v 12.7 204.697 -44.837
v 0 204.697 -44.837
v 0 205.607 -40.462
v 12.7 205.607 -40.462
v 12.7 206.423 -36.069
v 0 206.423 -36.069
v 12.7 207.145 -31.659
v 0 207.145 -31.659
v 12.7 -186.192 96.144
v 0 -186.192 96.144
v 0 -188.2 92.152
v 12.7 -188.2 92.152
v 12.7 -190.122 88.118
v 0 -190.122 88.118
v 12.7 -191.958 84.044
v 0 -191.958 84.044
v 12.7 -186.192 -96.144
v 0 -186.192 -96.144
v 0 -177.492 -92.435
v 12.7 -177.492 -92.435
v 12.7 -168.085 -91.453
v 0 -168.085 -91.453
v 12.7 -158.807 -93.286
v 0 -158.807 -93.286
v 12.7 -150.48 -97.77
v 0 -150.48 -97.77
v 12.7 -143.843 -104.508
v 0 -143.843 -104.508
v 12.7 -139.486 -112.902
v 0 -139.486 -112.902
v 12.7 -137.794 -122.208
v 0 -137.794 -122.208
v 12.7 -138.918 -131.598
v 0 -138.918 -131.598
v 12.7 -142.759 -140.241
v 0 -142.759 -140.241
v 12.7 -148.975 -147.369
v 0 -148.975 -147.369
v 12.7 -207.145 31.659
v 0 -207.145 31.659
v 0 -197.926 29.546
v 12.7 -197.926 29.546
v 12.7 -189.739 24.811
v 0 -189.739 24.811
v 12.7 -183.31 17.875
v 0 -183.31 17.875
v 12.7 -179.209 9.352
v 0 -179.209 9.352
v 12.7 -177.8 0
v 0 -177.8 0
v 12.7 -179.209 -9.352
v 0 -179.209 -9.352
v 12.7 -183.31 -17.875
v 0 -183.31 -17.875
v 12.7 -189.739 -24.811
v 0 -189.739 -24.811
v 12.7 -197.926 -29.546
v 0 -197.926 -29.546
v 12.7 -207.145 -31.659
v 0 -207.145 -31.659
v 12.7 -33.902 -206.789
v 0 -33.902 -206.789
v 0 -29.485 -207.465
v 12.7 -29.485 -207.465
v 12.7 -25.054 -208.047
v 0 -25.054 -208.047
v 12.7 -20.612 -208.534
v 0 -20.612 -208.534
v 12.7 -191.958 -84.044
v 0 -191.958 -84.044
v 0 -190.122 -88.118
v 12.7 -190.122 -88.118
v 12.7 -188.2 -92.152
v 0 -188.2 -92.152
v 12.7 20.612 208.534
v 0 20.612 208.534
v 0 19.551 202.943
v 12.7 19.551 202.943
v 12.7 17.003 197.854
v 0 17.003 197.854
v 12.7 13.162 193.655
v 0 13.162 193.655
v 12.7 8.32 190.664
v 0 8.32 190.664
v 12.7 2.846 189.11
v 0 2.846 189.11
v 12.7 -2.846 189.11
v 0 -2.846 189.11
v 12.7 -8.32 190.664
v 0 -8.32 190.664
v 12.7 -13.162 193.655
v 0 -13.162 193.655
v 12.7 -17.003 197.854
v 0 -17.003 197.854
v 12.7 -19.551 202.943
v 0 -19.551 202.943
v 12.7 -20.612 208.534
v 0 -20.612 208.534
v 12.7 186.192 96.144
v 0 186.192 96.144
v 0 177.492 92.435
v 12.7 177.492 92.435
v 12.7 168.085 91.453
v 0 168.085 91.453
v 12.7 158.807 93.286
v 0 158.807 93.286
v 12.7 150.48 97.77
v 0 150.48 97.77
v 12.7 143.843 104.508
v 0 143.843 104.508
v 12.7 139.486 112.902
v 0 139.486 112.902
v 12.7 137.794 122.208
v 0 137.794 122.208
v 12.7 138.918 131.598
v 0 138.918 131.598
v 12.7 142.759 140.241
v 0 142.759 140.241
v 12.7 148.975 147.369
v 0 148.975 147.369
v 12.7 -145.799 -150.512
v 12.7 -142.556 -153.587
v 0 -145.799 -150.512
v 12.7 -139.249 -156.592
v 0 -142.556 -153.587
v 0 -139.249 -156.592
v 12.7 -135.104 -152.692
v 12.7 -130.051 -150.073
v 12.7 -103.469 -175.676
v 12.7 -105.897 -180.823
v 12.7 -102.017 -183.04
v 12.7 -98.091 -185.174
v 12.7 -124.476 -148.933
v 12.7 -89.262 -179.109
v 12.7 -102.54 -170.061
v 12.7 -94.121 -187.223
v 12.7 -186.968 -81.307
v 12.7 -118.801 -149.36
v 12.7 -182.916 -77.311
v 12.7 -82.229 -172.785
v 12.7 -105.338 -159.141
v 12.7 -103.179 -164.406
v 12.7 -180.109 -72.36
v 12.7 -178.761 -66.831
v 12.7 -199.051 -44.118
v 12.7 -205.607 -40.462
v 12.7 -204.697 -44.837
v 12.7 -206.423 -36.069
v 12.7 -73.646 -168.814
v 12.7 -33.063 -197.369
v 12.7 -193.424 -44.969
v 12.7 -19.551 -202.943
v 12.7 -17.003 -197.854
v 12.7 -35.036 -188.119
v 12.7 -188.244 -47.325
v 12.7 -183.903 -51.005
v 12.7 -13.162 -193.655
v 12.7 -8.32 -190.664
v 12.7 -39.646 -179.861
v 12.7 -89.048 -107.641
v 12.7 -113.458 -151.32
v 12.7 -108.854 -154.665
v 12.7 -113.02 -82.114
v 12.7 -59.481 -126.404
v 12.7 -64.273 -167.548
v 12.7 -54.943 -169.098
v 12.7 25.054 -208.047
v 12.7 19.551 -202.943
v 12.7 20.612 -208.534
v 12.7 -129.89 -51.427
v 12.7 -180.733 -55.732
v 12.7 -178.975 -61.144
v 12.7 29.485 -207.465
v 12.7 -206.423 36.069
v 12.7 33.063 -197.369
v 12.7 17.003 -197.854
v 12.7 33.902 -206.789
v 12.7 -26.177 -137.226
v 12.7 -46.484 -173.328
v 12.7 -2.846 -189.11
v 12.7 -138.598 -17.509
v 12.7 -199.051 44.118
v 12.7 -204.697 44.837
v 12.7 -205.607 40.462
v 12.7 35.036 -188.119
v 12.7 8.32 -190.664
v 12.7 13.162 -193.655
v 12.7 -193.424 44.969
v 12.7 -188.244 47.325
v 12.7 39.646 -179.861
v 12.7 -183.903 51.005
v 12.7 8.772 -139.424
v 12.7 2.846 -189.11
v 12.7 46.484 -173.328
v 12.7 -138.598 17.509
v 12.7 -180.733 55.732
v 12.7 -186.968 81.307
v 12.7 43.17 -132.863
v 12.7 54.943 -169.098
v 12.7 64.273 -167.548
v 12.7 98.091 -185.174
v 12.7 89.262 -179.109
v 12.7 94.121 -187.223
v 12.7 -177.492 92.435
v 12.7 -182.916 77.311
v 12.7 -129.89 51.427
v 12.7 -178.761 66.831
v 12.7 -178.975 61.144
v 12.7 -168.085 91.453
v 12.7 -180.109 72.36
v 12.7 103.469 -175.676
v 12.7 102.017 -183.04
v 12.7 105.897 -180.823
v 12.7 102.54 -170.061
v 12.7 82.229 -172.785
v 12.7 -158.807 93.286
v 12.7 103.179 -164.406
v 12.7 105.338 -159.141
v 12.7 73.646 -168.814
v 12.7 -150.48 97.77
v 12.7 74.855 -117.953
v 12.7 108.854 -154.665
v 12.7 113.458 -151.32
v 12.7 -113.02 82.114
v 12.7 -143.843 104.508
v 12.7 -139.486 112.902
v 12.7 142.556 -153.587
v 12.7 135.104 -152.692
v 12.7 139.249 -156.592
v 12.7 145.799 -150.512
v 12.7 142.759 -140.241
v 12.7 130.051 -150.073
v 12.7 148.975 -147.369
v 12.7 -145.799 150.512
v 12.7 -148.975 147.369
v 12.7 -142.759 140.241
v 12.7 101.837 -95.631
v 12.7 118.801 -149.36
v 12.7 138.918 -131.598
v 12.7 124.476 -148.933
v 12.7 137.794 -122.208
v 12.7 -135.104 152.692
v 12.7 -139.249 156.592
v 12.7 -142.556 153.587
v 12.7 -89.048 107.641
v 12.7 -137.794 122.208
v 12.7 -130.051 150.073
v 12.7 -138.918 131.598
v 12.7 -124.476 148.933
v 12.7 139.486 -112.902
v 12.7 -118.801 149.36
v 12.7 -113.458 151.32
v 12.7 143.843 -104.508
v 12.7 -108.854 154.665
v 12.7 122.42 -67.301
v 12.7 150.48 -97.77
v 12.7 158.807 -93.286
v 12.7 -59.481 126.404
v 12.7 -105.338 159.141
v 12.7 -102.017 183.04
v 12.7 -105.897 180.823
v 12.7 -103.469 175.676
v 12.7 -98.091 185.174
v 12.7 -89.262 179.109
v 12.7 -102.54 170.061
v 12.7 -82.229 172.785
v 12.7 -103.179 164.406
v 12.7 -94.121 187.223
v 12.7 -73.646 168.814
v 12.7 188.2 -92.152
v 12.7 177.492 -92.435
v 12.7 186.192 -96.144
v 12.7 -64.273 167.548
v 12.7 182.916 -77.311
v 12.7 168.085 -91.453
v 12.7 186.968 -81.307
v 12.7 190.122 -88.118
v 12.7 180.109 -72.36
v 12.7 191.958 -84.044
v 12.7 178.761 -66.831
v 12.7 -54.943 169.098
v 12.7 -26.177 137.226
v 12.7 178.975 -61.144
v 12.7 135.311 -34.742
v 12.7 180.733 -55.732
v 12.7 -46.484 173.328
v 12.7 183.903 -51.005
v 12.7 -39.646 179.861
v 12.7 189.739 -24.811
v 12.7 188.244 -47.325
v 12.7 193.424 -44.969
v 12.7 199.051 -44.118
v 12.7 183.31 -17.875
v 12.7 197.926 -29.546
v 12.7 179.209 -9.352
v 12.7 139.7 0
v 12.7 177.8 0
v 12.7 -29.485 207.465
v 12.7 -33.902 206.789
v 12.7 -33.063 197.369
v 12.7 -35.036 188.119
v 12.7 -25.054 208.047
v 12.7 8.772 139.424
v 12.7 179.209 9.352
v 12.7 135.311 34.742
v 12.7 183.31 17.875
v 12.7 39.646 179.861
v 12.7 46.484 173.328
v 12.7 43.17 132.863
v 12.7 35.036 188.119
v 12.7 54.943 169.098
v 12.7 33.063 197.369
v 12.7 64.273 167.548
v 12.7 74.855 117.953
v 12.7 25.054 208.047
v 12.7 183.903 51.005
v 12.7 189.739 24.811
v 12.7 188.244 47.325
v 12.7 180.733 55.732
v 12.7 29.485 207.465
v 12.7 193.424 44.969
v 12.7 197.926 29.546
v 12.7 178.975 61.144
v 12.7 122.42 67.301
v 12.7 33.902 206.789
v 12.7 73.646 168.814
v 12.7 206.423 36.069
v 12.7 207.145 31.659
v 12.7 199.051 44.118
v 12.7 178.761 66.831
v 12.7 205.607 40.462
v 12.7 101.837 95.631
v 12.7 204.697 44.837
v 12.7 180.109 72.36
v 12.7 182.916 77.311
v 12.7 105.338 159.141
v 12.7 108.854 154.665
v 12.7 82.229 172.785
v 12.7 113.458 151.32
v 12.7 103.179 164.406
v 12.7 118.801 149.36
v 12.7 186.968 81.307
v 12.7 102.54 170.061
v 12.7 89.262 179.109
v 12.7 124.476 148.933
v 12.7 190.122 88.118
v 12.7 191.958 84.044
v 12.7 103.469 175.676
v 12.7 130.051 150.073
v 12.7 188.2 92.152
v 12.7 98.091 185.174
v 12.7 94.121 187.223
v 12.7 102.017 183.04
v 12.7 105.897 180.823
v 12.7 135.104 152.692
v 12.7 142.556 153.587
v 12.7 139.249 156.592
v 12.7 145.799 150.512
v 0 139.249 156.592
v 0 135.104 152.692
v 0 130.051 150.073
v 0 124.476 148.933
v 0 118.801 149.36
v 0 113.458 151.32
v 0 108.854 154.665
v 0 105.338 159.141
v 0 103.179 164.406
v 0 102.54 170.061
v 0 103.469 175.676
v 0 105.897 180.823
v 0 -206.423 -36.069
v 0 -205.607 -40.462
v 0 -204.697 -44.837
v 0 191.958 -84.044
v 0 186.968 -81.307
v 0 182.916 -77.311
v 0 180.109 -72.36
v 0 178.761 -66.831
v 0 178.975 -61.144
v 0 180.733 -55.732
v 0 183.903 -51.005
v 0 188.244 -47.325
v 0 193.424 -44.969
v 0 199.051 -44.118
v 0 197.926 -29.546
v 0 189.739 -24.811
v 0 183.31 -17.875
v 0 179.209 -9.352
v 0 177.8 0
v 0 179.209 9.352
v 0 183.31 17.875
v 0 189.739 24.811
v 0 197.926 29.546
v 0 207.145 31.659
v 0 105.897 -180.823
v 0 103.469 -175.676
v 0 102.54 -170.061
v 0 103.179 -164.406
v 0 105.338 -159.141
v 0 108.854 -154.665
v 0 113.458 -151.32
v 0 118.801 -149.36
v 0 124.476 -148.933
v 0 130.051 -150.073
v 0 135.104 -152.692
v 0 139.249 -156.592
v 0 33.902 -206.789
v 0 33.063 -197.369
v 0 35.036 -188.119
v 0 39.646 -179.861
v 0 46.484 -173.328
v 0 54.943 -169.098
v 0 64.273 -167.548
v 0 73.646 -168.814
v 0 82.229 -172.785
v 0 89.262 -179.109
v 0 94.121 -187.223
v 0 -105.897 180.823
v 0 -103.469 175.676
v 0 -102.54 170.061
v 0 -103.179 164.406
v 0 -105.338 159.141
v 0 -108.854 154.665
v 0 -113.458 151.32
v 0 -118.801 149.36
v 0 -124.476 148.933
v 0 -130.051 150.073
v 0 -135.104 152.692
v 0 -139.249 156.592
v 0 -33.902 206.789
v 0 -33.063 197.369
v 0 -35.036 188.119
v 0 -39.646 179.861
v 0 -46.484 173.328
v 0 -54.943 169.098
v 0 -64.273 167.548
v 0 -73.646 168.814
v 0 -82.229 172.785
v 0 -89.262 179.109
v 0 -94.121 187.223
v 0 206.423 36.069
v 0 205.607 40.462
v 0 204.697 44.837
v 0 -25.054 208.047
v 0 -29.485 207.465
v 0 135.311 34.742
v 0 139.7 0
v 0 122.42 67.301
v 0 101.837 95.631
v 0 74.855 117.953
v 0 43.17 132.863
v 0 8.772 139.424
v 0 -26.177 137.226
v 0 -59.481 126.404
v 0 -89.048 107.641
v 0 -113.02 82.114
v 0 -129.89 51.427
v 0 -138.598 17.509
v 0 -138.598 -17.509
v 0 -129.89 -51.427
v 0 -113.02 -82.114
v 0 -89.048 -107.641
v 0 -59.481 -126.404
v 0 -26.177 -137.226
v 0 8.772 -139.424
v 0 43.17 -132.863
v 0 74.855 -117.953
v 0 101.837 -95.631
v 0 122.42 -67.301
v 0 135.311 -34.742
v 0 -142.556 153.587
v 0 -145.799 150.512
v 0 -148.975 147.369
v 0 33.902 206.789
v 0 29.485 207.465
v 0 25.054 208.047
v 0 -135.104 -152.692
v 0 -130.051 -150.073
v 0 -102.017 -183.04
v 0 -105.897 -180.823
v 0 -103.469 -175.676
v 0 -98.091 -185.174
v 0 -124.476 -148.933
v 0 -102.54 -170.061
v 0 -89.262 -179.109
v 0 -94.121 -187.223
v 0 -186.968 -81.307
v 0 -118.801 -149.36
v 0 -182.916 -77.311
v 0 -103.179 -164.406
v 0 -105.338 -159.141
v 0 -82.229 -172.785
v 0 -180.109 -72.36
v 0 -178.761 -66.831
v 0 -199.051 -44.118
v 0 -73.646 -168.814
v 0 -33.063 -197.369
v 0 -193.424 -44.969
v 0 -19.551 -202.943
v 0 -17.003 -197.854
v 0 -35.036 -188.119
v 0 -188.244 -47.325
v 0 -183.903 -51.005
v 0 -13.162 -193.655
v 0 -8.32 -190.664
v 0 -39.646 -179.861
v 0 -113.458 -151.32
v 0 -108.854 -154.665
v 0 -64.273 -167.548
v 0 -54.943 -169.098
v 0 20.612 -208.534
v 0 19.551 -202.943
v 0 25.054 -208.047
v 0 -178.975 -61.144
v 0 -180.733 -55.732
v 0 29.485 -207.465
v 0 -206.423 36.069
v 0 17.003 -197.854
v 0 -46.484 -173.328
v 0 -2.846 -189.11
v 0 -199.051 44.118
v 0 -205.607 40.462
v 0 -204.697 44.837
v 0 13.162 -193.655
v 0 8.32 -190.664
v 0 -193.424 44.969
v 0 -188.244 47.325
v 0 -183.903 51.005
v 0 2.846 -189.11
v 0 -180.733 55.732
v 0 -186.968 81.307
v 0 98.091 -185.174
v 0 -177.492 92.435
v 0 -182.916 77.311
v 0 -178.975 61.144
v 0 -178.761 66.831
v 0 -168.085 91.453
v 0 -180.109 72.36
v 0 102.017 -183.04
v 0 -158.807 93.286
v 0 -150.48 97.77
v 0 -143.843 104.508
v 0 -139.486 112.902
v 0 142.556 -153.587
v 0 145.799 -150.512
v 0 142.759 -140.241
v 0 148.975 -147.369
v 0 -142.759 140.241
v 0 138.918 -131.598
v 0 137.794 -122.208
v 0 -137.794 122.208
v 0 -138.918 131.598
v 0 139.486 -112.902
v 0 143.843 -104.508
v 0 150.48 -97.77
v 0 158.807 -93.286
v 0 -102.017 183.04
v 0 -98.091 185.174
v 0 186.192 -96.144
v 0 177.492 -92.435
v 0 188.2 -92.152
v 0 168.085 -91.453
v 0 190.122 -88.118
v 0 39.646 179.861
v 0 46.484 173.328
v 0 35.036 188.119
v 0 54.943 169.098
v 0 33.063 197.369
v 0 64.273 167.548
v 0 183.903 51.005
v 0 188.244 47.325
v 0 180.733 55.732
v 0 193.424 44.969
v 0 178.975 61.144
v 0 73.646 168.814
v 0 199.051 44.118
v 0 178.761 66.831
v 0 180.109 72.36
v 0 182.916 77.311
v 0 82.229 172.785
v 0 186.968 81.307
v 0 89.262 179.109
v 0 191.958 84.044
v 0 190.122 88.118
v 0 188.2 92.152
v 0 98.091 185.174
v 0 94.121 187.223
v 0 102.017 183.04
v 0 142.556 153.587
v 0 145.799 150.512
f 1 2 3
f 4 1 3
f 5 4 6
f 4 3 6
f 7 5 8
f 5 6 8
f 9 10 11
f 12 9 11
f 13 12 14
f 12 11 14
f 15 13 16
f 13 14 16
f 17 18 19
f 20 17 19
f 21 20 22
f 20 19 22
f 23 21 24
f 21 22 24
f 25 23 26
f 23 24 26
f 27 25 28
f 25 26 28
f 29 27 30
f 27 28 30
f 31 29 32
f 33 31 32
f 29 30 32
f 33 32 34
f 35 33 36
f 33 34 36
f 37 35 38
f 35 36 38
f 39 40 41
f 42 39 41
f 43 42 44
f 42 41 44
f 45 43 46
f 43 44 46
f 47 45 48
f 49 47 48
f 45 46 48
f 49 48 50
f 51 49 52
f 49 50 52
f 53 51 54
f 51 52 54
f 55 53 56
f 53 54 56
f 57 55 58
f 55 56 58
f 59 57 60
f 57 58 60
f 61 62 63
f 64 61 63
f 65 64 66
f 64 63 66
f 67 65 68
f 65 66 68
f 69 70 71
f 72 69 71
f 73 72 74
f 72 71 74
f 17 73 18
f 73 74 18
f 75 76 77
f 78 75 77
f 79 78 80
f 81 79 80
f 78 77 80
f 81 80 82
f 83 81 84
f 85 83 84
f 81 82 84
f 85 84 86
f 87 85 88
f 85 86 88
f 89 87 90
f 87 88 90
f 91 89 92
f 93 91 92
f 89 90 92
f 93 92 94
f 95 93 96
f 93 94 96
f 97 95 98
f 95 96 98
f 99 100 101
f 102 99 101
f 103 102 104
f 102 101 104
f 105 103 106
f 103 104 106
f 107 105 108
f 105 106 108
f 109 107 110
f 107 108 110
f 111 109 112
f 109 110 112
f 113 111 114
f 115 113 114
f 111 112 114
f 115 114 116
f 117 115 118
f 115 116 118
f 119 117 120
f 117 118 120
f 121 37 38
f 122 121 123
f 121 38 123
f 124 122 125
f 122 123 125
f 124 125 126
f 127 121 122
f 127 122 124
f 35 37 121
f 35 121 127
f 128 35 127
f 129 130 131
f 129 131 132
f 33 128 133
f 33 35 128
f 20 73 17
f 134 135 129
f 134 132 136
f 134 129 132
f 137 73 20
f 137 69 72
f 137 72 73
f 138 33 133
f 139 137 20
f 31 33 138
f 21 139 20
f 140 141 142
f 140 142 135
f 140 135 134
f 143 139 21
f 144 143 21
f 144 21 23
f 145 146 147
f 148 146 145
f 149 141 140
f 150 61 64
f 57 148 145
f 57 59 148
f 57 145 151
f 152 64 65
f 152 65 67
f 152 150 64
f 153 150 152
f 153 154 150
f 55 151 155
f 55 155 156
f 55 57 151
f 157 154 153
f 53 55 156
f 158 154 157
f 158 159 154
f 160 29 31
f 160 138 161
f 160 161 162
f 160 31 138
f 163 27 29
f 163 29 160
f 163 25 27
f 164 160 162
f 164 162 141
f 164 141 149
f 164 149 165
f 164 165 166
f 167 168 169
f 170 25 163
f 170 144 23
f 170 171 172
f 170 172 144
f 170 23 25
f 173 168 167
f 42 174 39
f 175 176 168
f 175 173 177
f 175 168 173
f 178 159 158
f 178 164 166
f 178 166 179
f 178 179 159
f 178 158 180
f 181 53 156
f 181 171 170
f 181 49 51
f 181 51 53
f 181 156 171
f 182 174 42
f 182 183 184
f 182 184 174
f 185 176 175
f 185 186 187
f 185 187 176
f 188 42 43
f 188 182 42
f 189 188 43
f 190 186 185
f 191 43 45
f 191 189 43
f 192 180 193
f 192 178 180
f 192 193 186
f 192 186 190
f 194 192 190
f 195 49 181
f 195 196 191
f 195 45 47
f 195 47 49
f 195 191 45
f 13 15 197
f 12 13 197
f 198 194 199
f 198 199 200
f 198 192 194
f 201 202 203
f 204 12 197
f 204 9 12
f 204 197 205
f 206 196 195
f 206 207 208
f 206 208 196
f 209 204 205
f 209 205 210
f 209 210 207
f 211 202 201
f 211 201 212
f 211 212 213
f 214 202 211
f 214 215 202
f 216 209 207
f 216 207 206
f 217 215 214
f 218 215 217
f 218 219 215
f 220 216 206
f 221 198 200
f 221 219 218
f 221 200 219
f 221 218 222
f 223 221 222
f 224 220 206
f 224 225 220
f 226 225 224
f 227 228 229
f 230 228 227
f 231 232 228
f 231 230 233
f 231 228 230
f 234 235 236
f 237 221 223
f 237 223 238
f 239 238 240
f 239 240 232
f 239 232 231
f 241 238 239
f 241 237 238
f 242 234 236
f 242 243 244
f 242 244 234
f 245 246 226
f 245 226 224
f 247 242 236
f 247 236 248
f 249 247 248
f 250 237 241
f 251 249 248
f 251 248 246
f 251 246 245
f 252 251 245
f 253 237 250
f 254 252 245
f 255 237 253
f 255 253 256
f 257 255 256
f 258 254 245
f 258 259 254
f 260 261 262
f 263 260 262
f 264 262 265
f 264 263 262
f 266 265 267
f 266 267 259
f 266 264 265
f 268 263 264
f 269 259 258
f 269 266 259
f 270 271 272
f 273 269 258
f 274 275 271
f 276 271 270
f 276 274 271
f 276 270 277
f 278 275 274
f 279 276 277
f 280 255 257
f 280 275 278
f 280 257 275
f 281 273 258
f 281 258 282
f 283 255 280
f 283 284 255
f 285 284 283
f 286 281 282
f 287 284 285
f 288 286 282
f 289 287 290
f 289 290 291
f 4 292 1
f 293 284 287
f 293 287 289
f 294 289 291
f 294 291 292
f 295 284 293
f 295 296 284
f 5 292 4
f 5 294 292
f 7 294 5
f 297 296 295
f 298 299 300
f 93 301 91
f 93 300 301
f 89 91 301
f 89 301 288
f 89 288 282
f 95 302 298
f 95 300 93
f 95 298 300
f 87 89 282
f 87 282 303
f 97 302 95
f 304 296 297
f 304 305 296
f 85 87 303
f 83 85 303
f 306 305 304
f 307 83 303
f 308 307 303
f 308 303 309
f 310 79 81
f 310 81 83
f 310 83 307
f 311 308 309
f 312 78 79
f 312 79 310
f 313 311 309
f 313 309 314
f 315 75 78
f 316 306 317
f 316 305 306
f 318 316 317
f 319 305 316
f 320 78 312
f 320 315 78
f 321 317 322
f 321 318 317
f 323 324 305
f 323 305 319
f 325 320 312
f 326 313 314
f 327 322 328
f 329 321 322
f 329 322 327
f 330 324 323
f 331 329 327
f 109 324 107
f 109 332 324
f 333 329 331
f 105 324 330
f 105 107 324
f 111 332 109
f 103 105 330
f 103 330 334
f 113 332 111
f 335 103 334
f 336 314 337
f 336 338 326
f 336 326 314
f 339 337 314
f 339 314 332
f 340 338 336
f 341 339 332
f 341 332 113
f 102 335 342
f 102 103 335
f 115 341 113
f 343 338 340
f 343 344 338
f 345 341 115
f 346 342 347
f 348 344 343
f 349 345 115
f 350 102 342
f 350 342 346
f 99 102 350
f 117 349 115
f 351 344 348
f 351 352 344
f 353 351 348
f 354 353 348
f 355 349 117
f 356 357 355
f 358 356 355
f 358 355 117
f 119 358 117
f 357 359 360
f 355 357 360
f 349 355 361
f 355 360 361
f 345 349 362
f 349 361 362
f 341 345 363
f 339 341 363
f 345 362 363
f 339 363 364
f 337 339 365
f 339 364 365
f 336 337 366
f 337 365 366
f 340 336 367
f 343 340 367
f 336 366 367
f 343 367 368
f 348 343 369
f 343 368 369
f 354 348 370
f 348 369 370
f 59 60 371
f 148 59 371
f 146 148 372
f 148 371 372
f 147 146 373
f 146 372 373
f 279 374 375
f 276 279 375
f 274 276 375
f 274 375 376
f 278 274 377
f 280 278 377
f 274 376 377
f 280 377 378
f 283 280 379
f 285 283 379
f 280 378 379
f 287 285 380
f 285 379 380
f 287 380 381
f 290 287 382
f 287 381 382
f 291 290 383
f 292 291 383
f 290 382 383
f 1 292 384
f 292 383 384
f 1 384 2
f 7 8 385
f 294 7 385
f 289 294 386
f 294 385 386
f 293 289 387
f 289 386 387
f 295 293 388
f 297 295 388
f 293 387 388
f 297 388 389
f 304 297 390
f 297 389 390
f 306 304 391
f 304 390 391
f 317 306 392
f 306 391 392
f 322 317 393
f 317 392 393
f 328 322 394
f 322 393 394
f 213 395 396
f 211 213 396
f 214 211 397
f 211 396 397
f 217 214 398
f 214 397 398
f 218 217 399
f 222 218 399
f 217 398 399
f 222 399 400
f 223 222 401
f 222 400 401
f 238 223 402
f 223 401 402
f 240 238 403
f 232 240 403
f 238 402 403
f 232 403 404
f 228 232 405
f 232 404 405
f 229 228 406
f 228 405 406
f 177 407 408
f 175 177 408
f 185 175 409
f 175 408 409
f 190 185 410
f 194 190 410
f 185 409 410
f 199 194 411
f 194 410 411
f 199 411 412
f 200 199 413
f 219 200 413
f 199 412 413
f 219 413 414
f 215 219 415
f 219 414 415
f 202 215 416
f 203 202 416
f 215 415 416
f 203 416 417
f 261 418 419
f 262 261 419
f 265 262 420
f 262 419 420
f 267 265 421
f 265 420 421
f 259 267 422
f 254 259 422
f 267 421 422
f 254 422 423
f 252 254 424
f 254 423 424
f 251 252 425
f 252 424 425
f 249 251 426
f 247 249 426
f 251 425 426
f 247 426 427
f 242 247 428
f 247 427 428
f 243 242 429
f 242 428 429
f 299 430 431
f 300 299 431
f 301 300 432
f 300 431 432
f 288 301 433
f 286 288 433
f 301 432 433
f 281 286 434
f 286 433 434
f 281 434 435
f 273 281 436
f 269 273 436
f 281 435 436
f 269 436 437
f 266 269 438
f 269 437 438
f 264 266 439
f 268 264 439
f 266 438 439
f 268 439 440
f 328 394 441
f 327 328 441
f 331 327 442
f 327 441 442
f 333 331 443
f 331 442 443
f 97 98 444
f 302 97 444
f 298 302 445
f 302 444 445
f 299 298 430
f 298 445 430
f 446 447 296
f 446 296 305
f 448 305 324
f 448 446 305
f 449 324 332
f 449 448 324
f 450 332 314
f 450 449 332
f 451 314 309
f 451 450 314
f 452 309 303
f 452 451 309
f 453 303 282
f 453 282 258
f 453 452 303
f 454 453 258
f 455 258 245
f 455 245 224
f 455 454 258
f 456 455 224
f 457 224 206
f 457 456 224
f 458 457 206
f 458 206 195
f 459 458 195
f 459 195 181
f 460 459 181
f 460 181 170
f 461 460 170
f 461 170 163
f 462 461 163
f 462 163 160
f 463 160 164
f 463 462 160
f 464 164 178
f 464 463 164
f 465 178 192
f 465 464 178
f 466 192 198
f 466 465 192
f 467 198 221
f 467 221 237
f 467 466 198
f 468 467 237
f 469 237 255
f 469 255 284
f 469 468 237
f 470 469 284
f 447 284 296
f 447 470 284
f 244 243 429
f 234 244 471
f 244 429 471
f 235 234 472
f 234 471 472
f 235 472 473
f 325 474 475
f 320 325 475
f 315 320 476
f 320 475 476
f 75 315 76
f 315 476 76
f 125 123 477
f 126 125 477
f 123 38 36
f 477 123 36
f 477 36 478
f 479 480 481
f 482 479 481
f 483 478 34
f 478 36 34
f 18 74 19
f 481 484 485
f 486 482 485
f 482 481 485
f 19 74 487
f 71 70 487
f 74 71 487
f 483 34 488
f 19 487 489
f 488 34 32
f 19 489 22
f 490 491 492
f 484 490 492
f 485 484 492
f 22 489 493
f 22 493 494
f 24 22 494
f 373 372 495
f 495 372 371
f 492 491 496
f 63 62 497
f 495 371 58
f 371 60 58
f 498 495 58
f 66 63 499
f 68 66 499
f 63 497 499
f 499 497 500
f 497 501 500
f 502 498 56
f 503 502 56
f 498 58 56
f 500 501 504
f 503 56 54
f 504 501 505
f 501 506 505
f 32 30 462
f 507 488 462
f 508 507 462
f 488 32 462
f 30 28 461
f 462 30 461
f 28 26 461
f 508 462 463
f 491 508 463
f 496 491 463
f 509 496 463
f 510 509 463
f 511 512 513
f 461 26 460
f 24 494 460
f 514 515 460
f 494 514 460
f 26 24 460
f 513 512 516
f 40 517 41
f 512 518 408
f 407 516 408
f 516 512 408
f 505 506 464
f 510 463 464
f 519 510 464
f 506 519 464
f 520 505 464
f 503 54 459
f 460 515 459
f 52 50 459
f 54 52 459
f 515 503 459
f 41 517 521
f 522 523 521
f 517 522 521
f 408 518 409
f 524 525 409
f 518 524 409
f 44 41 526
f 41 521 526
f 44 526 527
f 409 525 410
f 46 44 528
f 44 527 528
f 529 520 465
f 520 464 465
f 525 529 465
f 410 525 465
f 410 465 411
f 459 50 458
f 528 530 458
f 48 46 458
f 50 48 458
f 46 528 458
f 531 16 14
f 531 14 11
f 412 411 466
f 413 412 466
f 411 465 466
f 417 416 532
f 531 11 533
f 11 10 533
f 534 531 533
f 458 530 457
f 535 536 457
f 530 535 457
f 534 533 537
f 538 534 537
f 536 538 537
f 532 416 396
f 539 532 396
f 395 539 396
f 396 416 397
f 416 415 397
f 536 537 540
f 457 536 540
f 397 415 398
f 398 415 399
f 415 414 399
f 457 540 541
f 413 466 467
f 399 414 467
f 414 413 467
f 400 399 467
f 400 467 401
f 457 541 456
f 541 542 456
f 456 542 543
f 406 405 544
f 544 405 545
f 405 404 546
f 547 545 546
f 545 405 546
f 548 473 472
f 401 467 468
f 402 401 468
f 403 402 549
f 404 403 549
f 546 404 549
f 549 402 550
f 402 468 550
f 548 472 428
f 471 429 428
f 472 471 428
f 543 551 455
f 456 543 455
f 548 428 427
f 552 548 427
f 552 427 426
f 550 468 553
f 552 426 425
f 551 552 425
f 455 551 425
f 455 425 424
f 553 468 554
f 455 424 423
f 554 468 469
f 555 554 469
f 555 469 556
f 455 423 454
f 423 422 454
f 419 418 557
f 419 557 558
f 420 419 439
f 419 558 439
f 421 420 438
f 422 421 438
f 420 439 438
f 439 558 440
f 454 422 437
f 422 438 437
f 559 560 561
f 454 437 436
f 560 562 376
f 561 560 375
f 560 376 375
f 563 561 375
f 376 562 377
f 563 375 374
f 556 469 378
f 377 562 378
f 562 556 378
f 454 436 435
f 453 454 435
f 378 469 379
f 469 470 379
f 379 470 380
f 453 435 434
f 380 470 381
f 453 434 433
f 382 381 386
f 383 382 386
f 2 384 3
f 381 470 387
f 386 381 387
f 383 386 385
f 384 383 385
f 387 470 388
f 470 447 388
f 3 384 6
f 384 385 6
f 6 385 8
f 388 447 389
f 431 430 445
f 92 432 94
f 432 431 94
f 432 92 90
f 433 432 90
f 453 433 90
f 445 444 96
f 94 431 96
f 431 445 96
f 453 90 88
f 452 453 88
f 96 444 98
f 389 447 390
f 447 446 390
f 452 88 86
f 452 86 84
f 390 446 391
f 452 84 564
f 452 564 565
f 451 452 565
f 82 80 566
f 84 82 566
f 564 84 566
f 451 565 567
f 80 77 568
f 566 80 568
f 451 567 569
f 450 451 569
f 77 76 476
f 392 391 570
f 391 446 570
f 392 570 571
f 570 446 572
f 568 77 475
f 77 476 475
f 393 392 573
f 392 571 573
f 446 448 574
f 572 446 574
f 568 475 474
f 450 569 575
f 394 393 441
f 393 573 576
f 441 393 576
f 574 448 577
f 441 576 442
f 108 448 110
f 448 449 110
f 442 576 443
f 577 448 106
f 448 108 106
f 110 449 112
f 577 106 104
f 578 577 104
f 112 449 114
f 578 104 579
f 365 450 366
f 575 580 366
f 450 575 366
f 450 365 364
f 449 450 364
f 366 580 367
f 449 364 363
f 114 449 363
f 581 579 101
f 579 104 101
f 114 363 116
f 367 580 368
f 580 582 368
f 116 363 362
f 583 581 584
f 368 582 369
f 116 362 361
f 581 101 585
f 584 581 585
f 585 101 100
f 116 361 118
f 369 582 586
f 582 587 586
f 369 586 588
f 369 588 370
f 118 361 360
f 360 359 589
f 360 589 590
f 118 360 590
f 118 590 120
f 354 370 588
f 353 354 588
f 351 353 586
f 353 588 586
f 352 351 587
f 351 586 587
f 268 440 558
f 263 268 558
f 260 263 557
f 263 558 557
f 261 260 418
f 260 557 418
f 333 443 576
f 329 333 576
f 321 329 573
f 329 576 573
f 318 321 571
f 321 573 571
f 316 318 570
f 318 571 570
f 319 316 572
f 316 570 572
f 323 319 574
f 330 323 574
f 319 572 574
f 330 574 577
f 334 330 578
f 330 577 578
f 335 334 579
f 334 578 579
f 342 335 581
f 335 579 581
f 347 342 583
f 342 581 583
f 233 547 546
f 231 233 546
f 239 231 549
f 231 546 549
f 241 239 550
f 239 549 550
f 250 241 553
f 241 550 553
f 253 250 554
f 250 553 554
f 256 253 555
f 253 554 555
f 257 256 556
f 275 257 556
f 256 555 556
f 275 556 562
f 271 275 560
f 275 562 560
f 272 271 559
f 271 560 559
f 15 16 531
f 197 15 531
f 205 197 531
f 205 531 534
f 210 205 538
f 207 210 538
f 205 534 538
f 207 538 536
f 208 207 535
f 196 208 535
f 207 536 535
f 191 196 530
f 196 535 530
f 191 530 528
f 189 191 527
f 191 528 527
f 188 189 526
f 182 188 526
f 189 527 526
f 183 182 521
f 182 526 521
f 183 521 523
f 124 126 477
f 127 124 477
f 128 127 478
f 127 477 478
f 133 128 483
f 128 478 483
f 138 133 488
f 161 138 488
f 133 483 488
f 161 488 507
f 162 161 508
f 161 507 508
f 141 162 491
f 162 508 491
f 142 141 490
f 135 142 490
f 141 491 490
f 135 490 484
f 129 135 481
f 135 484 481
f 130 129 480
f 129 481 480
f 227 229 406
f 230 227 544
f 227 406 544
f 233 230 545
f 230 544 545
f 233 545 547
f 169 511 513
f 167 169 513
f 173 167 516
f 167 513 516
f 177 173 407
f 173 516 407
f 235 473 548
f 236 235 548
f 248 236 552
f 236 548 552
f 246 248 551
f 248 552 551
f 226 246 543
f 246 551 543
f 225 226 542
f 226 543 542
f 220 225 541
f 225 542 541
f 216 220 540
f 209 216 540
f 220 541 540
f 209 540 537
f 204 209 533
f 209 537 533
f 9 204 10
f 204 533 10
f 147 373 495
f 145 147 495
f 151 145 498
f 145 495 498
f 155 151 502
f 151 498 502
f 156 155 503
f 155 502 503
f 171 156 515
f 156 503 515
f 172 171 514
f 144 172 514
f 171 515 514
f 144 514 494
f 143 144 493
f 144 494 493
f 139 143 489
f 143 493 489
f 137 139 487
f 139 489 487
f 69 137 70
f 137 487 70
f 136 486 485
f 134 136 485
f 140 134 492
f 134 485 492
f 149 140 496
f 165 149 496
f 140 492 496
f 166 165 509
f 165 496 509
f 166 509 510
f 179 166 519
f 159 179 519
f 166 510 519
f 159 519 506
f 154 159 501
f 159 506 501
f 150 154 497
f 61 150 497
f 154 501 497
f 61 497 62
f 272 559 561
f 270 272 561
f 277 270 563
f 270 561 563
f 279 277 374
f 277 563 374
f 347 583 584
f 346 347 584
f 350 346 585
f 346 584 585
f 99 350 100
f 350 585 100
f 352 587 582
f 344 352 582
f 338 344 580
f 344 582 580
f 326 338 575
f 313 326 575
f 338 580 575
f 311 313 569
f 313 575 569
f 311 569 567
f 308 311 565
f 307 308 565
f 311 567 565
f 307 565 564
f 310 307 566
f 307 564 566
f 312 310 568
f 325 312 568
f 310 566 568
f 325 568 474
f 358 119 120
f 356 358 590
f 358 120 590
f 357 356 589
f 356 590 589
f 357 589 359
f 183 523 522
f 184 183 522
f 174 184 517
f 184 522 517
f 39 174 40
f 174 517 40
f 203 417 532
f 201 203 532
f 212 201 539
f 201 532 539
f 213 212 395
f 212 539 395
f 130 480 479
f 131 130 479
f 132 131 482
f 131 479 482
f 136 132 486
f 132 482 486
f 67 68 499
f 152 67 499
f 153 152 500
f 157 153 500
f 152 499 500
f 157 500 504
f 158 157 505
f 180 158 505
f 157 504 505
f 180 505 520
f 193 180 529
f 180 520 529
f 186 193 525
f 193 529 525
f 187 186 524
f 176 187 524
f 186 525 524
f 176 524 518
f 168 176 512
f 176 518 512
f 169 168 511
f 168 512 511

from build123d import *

# Parameters (mm, degrees)
F0_R     = 139.7
F1_DEPTH = 12.7


with BuildPart() as f1:
    # F0 (on Right) → F1 (new body)
    with BuildSketch(Plane.YZ):
        with BuildLine():
            ThreePointArc((20.612464, 208.533759), (0, 188.9125), (-20.612464, 208.533759))
            ThreePointArc((-20.612464, 208.533759), (-27.271164, 207.767866), (-33.901963, 206.789408))
            ThreePointArc((-33.901963, 206.789408), (-54.943222, 169.097849), (-94.120501, 187.223219))
            ThreePointArc((-94.120501, 187.223219), (-100.060053, 184.117322), (-105.897235, 180.823058))
            ThreePointArc((-105.897235, 180.823058), (-111.039981, 152.833423), (-139.248902, 156.591653))
            ThreePointArc((-139.248902, 156.591653), (-144.185722, 152.058147), (-148.975029, 147.369072))
            ThreePointArc((-148.975029, 147.369072), (-143.843222, 104.508218), (-186.192132, 96.144124))
            ThreePointArc((-186.192132, 96.144124), (-189.17173, 90.140219), (-191.957789, 84.044094))
            ThreePointArc((-191.957789, 84.044094), (-179.666464, 58.377173), (-204.696992, 44.836858))
            ThreePointArc((-204.696992, 44.836858), (-206.026236, 38.267384), (-207.144697, 31.658759))
            ThreePointArc((-207.144697, 31.658759), (-177.8, 0), (-207.144697, -31.658759))
            ThreePointArc((-207.144697, -31.658759), (-206.026236, -38.267384), (-204.696992, -44.836858))
            ThreePointArc((-204.696992, -44.836858), (-179.666464, -58.377173), (-191.957789, -84.044094))
            ThreePointArc((-191.957789, -84.044094), (-189.17173, -90.140219), (-186.192132, -96.144124))
            ThreePointArc((-186.192132, -96.144124), (-143.843222, -104.508218), (-148.975029, -147.369072))
            ThreePointArc((-148.975029, -147.369072), (-144.185722, -152.058147), (-139.248902, -156.591653))
            ThreePointArc((-139.248902, -156.591653), (-111.039981, -152.833423), (-105.897235, -180.823058))
            ThreePointArc((-105.897235, -180.823058), (-100.060053, -184.117322), (-94.120501, -187.223219))
            ThreePointArc((-94.120501, -187.223219), (-54.943222, -169.097849), (-33.901963, -206.789408))
            ThreePointArc((-33.901963, -206.789408), (-27.271164, -207.767866), (-20.612464, -208.533759))
            ThreePointArc((-20.612464, -208.533759), (0, -188.9125), (20.612464, -208.533759))
            ThreePointArc((20.612464, -208.533759), (27.271164, -207.767866), (33.901963, -206.789408))
            ThreePointArc((33.901963, -206.789408), (54.943222, -169.097849), (94.120501, -187.223219))
            ThreePointArc((94.120501, -187.223219), (100.060053, -184.117322), (105.897235, -180.823058))
            ThreePointArc((105.897235, -180.823058), (111.039981, -152.833423), (139.248902, -156.591653))
            ThreePointArc((139.248902, -156.591653), (144.185722, -152.058147), (148.975029, -147.369072))
            ThreePointArc((148.975029, -147.369072), (143.843222, -104.508218), (186.192132, -96.144124))
            ThreePointArc((186.192132, -96.144124), (189.17173, -90.140219), (191.957789, -84.044094))
            ThreePointArc((191.957789, -84.044094), (179.666464, -58.377173), (204.696992, -44.836858))
            ThreePointArc((204.696992, -44.836858), (206.026236, -38.267384), (207.144697, -31.658759))
            ThreePointArc((207.144697, -31.658759), (177.8, 0), (207.144697, 31.658759))
            ThreePointArc((207.144697, 31.658759), (206.026236, 38.267384), (204.696992, 44.836858))
            ThreePointArc((204.696992, 44.836858), (179.666464, 58.377173), (191.957789, 84.044094))
            ThreePointArc((191.957789, 84.044094), (189.17173, 90.140219), (186.192132, 96.144124))
            ThreePointArc((186.192132, 96.144124), (143.843222, 104.508218), (148.975029, 147.369072))
            ThreePointArc((148.975029, 147.369072), (144.185722, 152.058147), (139.248902, 156.591653))
            ThreePointArc((139.248902, 156.591653), (111.039981, 152.833423), (105.897235, 180.823058))
            ThreePointArc((105.897235, 180.823058), (100.060053, 184.117322), (94.120501, 187.223219))
            ThreePointArc((94.120501, 187.223219), (54.943222, 169.097849), (33.901963, 206.789408))
            ThreePointArc((33.901963, 206.789408), (27.271164, 207.767866), (20.612464, 208.533759))
        make_face()
        Circle(F0_R, mode=Mode.SUBTRACT)
    extrude(amount=F1_DEPTH)


solid = f1.part
